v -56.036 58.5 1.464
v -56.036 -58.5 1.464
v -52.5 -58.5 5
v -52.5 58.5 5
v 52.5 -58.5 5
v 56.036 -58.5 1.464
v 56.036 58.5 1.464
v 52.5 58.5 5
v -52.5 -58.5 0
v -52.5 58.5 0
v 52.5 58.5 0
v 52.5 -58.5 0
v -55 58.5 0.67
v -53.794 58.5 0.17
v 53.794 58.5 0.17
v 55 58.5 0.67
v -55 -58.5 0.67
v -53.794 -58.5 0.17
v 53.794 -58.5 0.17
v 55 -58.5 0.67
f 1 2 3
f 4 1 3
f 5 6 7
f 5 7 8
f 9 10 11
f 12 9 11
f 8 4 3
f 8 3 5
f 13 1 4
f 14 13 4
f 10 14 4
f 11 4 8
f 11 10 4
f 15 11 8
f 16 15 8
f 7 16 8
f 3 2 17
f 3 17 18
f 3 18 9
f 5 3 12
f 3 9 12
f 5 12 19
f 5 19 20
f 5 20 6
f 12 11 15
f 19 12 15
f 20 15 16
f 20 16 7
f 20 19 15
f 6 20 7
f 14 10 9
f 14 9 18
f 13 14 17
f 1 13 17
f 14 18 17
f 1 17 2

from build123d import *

# Parameters (mm, degrees)
SKETCH1_W           = 105
SKETCH1_H           = 117
BOSS_EXTRUDE1_DEPTH = 5
BOSS_EXTRUDE2_DEPTH = 117


with BuildPart() as part:
    # Sketch1 → Boss-Extrude1 (new body)
    with BuildSketch(Plane.XY):
        Rectangle(SKETCH1_W, SKETCH1_H)
    extrude(amount=BOSS_EXTRUDE1_DEPTH)


with BuildPart() as body_2:
    # Sketch2 → Boss-Extrude2 (new body)
    with BuildSketch(Plane.XZ.offset(58.5)):
        with BuildLine():
            ThreePointArc((-52.5, 0), (-54.413417162, 0.380602337), (-56.035533906, 1.464466094))
            Line((-56.035533906, 1.464466094), (-52.5, 5))
            Line((-52.5, 5), (-52.5, 0))
        make_face()
    extrude(amount=-BOSS_EXTRUDE2_DEPTH)


with BuildPart() as body_3:
    # Mirror1: mirrored copy
    add(body_2.part.mirror(Plane.ZY))


with BuildPart() as body_2_1:
    add(body_2.part)

    # Combine1: union body 3, part
    add(body_3.part)
    add(part.part)


solid = body_2_1.part
